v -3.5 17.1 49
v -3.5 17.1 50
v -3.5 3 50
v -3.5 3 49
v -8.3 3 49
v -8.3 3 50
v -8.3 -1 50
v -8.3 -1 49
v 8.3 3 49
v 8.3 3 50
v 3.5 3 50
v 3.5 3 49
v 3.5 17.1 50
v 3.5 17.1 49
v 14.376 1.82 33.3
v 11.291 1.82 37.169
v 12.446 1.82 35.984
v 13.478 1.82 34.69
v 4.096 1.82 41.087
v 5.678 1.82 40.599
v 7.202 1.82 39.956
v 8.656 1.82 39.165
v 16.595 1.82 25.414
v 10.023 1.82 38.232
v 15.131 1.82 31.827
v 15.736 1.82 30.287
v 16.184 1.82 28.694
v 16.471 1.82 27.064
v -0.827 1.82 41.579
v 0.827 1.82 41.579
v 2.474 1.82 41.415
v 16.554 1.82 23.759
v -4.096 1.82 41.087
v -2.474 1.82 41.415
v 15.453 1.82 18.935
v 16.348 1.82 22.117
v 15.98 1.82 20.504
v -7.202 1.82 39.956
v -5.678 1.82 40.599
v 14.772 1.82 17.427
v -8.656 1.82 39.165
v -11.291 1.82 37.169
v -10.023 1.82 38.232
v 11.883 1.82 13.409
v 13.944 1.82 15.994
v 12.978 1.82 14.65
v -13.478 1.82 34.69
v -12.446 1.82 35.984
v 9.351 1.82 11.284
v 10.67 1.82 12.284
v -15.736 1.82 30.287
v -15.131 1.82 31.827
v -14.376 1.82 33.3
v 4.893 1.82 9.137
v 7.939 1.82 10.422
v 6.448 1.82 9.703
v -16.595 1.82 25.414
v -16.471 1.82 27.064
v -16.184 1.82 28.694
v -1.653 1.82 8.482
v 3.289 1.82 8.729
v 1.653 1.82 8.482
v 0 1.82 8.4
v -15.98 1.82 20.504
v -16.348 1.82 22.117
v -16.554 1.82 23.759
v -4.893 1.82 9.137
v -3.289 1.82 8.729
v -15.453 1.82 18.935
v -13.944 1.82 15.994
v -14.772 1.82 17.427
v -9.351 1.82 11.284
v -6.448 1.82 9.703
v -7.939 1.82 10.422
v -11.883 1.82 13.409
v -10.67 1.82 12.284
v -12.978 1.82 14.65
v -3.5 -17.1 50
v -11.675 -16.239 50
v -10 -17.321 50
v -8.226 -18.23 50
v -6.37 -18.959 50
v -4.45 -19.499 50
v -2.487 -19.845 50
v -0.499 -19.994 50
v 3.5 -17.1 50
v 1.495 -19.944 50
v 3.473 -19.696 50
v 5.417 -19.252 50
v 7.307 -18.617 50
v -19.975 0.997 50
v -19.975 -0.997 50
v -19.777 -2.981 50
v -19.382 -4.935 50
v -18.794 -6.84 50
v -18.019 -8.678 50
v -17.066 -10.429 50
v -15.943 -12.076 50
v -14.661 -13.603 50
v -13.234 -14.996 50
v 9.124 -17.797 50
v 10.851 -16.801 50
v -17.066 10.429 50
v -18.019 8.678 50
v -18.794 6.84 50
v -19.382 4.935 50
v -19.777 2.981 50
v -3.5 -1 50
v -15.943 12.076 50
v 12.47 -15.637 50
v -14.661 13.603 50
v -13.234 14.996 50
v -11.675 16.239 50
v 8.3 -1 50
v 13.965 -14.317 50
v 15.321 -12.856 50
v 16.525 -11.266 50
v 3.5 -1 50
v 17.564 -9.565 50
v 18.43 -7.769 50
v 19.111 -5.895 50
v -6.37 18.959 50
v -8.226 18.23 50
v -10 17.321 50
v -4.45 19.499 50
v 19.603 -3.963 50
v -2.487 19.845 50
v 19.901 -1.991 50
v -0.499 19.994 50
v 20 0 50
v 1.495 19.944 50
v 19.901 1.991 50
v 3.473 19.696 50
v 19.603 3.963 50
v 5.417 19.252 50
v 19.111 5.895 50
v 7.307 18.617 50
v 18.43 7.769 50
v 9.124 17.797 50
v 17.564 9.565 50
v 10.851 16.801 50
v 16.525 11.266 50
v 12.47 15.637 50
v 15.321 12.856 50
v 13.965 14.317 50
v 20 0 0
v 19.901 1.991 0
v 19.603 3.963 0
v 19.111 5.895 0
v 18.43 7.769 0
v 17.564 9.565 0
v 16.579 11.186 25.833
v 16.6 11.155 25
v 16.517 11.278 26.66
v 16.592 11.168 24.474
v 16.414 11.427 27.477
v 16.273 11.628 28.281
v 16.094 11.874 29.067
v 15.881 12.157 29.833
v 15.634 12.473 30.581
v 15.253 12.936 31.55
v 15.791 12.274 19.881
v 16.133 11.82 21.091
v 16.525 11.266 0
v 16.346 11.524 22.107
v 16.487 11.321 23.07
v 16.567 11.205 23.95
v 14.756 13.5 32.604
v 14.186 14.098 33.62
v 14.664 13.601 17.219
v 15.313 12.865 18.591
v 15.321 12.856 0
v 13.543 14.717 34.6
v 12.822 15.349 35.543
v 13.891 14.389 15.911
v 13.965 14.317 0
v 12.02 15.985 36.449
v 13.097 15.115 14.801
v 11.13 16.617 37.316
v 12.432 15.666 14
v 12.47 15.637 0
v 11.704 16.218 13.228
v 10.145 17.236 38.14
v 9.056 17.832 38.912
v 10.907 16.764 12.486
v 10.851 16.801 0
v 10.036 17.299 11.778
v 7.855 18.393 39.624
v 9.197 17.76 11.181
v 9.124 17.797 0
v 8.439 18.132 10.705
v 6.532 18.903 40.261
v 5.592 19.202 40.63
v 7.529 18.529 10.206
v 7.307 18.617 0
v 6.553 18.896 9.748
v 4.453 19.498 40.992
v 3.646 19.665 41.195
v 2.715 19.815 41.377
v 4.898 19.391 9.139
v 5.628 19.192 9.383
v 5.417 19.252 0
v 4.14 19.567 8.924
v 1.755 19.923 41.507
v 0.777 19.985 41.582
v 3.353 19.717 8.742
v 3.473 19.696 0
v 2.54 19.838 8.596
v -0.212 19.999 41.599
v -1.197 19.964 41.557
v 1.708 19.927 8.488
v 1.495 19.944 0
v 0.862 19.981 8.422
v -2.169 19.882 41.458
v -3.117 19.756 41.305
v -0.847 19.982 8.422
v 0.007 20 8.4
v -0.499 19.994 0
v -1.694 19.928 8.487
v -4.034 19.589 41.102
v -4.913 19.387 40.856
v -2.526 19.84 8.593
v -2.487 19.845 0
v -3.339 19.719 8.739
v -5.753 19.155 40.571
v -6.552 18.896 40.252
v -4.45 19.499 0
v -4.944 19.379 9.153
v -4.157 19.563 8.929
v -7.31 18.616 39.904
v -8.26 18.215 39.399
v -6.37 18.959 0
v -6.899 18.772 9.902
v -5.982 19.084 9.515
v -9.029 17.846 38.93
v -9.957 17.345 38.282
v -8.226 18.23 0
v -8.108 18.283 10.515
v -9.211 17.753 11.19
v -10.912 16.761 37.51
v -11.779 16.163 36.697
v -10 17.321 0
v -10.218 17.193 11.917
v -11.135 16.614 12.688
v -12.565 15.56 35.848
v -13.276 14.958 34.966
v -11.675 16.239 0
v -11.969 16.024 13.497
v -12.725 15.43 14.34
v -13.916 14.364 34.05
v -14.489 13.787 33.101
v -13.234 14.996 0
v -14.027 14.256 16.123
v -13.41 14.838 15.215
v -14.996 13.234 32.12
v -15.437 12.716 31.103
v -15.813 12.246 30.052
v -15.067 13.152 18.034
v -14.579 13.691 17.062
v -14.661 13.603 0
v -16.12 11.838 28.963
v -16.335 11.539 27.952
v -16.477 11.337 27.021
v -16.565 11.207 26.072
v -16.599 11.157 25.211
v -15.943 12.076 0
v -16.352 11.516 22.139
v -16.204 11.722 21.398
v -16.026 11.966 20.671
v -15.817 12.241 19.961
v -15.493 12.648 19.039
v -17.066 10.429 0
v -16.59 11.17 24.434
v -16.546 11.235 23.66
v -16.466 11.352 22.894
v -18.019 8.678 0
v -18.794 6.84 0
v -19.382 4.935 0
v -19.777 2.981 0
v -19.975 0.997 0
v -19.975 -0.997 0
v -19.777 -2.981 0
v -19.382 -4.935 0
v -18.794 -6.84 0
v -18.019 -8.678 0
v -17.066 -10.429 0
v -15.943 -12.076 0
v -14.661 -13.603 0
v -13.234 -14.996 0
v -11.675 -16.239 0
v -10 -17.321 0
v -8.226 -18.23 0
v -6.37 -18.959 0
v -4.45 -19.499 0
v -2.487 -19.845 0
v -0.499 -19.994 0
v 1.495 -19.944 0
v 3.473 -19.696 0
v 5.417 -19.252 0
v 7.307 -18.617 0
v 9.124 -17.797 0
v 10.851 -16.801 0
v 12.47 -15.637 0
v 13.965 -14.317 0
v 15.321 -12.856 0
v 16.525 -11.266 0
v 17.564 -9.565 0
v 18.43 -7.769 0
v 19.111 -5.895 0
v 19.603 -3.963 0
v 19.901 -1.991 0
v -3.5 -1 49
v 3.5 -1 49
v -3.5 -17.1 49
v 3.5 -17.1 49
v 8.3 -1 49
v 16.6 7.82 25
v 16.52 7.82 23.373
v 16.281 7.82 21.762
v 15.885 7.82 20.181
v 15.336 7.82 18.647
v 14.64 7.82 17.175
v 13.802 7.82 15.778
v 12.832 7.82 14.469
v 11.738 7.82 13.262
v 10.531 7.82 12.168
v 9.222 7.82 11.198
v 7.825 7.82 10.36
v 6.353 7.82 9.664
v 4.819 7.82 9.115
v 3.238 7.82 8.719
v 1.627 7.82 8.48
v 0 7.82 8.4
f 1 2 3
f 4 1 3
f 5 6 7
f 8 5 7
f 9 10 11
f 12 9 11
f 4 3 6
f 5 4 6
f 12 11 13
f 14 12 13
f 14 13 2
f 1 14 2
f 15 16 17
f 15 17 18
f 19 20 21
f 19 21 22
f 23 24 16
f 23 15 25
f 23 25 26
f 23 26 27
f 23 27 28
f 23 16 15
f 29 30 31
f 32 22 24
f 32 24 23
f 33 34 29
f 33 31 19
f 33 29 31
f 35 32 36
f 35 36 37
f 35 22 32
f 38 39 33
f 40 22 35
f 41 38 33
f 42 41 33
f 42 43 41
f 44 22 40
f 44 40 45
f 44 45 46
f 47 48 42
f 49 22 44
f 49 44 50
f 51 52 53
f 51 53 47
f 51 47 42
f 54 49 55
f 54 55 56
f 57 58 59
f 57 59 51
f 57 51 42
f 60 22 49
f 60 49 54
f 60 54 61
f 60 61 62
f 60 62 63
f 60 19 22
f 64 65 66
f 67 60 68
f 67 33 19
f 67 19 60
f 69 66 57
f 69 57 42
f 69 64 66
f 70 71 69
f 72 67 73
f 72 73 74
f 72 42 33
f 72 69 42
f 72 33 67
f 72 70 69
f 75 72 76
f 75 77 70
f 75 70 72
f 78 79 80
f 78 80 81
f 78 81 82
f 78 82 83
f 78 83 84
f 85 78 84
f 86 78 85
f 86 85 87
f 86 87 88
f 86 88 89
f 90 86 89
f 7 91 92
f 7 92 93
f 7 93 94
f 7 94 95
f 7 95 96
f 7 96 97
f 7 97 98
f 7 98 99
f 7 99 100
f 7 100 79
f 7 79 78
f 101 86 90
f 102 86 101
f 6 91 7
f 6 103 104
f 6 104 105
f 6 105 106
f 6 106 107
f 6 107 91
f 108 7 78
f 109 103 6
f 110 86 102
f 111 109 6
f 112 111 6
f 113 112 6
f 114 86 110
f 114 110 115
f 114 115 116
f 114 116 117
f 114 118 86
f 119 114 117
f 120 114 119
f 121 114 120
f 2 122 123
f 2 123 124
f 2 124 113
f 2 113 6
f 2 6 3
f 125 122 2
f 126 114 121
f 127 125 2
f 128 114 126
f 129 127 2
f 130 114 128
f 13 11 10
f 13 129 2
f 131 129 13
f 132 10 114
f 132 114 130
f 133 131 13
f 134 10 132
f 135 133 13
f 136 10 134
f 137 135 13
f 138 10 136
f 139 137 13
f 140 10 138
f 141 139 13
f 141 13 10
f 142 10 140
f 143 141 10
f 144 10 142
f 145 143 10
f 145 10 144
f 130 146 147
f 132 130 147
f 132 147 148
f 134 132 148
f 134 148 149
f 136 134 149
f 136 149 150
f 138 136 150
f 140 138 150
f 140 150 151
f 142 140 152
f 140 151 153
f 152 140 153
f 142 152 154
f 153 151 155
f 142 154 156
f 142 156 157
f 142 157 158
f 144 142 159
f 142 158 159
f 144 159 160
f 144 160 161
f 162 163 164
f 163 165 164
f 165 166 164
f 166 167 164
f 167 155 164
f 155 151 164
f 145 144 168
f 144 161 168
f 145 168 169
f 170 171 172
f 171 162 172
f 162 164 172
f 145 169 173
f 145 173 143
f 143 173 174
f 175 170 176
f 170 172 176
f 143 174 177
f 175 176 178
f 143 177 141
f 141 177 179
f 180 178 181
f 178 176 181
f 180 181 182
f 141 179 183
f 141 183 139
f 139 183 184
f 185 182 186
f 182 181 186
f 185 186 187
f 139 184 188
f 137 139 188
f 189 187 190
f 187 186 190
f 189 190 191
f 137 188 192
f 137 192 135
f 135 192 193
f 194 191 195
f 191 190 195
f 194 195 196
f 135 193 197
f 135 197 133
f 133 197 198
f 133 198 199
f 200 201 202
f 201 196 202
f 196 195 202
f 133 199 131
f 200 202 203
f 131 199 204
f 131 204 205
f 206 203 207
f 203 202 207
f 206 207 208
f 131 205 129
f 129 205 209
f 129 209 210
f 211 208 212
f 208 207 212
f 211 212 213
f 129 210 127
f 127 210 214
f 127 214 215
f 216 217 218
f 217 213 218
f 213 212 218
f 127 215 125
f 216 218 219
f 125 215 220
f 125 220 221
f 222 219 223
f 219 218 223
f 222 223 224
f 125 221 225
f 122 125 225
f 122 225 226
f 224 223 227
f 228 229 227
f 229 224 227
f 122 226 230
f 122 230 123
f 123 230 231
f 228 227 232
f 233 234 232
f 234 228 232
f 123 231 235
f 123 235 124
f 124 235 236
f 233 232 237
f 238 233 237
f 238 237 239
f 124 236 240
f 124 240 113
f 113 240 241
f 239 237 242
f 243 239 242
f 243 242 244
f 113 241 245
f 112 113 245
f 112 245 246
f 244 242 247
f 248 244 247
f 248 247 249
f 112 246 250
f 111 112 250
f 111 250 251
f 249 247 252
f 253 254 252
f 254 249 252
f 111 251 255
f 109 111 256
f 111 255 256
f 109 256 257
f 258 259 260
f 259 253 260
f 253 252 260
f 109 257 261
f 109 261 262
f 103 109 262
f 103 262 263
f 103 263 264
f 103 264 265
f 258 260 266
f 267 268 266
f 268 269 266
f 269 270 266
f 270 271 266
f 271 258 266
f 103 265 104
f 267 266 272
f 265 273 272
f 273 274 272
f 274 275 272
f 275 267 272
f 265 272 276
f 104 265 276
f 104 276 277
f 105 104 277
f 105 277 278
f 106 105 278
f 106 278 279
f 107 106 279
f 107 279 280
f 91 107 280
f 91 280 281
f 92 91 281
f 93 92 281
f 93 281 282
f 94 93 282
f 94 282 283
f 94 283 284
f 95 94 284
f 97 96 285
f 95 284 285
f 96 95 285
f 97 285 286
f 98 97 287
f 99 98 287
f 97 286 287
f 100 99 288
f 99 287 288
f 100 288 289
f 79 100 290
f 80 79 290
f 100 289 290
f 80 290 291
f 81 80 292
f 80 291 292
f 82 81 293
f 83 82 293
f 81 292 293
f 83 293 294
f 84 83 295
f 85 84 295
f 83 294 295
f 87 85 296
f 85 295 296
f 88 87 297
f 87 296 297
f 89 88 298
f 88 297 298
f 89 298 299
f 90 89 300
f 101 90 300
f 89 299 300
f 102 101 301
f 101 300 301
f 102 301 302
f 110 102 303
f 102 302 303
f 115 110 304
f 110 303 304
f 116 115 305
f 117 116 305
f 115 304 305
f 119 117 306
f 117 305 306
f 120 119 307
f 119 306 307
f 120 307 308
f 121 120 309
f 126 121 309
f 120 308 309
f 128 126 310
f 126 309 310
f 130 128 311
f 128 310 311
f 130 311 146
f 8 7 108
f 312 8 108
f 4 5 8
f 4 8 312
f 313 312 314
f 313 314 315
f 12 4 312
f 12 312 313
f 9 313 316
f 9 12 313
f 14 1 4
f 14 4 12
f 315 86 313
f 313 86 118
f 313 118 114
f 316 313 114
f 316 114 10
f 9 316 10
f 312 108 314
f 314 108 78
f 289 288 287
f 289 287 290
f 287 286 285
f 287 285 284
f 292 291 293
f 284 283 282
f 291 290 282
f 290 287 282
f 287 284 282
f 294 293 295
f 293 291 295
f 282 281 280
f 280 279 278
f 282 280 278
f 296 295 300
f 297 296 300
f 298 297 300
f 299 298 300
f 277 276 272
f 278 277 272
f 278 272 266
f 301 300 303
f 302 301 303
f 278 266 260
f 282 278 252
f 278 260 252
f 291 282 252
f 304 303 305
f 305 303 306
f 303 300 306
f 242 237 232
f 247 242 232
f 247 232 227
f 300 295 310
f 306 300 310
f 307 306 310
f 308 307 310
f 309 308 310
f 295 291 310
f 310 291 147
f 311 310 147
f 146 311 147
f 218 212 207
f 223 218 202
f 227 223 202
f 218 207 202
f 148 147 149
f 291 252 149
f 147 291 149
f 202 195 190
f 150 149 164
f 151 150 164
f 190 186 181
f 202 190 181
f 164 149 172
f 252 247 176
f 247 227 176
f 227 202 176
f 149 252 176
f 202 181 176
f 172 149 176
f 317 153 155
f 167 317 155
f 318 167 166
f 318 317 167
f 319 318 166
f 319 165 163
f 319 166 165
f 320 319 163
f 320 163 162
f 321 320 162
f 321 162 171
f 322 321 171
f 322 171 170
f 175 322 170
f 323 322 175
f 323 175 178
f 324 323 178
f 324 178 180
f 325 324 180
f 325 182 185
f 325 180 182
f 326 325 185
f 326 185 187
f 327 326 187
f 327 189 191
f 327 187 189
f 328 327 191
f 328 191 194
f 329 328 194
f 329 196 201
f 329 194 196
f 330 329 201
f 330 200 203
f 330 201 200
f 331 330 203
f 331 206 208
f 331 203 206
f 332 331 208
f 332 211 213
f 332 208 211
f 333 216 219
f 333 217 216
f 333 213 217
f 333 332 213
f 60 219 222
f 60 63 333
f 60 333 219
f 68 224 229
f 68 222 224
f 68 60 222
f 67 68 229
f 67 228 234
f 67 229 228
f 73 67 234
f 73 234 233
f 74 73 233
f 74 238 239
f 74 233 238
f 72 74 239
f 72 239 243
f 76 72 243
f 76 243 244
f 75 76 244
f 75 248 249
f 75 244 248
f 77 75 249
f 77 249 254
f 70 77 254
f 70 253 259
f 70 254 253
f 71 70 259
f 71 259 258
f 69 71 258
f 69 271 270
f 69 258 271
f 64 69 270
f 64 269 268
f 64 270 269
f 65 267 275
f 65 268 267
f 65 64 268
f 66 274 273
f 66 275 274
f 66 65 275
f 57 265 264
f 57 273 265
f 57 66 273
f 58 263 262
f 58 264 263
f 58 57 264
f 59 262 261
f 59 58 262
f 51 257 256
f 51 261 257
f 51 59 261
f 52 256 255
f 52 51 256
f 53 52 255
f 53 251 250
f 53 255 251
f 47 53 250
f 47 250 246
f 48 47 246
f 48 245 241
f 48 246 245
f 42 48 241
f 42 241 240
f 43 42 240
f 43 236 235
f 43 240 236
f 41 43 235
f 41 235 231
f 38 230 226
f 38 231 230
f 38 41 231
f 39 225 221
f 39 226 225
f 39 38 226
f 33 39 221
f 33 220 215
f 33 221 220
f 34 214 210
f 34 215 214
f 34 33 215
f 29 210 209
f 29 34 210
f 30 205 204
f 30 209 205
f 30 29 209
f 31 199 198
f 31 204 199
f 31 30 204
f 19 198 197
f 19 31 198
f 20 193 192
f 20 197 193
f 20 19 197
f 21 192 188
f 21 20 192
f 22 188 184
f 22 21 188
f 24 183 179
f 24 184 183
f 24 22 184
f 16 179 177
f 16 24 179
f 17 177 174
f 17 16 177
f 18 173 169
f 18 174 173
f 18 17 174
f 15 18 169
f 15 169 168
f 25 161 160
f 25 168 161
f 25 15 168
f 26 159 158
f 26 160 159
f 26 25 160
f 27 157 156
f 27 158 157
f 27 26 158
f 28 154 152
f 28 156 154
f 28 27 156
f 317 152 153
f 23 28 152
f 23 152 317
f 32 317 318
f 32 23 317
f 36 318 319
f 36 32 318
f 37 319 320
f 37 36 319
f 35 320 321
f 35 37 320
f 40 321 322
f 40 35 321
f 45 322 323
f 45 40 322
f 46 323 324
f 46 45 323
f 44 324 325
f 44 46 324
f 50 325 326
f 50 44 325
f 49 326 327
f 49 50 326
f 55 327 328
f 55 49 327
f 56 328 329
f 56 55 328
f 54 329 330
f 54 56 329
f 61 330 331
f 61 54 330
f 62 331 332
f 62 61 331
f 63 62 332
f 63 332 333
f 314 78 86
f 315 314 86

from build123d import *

# Parameters (mm, degrees)
CROQUIS1_R              = 20
SALIENTE_EXTRUIR1_DEPTH = 50
CROQUIS3D1_R            = 16.6
CORTAR_EXTRUIR2_DEPTH   = 12.2
CORTAR_EXTRUIR4_DEPTH   = 1
CROQUIS10_R             = 16.6
CORTAR_EXTRUIR5_DEPTH   = 6


with BuildPart() as part:
    # Croquis1 → Saliente-Extruir1 (new body)
    with BuildSketch(Plane.XY):
        Circle(CROQUIS1_R)
    extrude(amount=SALIENTE_EXTRUIR1_DEPTH)

    # Croquis3D1 → Cortar-Extruir2 (cut)
    with BuildSketch(Plane(origin=(0, 20.020318539, 25), x_dir=(1, 0, 0), z_dir=(0, -1, 0))):
        Circle(CROQUIS3D1_R)
    extrude(amount=CORTAR_EXTRUIR2_DEPTH, mode=Mode.SUBTRACT)

    # Croquis4 → Cortar-Extruir4 (cut)
    with BuildSketch(Plane.XY.offset(50)):
        Polygon((8.3, 3), (3.5, 3), (3.5, 17.1), (-3.5, 17.1), (-3.5, 3), (-8.3, 3), (-8.3, 1), (-8.3, -1), (-3.5, -1), (-3.5, -2), (-3.5, -17.1), (3.5, -17.1), (3.5, -2), (3.5, -1), (8.3, -1), (8.3, 1), align=None)
    extrude(amount=-CORTAR_EXTRUIR4_DEPTH, mode=Mode.SUBTRACT)

    # Croquis10 → Cortar-Extruir5 (cut)
    with BuildSketch(Plane(origin=(0, 7.820318539, 0), x_dir=(1, 0, 0), z_dir=(0, 1, 0))):
        with Locations((0, -25)):
            Circle(CROQUIS10_R)
    extrude(amount=-CORTAR_EXTRUIR5_DEPTH, mode=Mode.SUBTRACT)


solid = part.part
